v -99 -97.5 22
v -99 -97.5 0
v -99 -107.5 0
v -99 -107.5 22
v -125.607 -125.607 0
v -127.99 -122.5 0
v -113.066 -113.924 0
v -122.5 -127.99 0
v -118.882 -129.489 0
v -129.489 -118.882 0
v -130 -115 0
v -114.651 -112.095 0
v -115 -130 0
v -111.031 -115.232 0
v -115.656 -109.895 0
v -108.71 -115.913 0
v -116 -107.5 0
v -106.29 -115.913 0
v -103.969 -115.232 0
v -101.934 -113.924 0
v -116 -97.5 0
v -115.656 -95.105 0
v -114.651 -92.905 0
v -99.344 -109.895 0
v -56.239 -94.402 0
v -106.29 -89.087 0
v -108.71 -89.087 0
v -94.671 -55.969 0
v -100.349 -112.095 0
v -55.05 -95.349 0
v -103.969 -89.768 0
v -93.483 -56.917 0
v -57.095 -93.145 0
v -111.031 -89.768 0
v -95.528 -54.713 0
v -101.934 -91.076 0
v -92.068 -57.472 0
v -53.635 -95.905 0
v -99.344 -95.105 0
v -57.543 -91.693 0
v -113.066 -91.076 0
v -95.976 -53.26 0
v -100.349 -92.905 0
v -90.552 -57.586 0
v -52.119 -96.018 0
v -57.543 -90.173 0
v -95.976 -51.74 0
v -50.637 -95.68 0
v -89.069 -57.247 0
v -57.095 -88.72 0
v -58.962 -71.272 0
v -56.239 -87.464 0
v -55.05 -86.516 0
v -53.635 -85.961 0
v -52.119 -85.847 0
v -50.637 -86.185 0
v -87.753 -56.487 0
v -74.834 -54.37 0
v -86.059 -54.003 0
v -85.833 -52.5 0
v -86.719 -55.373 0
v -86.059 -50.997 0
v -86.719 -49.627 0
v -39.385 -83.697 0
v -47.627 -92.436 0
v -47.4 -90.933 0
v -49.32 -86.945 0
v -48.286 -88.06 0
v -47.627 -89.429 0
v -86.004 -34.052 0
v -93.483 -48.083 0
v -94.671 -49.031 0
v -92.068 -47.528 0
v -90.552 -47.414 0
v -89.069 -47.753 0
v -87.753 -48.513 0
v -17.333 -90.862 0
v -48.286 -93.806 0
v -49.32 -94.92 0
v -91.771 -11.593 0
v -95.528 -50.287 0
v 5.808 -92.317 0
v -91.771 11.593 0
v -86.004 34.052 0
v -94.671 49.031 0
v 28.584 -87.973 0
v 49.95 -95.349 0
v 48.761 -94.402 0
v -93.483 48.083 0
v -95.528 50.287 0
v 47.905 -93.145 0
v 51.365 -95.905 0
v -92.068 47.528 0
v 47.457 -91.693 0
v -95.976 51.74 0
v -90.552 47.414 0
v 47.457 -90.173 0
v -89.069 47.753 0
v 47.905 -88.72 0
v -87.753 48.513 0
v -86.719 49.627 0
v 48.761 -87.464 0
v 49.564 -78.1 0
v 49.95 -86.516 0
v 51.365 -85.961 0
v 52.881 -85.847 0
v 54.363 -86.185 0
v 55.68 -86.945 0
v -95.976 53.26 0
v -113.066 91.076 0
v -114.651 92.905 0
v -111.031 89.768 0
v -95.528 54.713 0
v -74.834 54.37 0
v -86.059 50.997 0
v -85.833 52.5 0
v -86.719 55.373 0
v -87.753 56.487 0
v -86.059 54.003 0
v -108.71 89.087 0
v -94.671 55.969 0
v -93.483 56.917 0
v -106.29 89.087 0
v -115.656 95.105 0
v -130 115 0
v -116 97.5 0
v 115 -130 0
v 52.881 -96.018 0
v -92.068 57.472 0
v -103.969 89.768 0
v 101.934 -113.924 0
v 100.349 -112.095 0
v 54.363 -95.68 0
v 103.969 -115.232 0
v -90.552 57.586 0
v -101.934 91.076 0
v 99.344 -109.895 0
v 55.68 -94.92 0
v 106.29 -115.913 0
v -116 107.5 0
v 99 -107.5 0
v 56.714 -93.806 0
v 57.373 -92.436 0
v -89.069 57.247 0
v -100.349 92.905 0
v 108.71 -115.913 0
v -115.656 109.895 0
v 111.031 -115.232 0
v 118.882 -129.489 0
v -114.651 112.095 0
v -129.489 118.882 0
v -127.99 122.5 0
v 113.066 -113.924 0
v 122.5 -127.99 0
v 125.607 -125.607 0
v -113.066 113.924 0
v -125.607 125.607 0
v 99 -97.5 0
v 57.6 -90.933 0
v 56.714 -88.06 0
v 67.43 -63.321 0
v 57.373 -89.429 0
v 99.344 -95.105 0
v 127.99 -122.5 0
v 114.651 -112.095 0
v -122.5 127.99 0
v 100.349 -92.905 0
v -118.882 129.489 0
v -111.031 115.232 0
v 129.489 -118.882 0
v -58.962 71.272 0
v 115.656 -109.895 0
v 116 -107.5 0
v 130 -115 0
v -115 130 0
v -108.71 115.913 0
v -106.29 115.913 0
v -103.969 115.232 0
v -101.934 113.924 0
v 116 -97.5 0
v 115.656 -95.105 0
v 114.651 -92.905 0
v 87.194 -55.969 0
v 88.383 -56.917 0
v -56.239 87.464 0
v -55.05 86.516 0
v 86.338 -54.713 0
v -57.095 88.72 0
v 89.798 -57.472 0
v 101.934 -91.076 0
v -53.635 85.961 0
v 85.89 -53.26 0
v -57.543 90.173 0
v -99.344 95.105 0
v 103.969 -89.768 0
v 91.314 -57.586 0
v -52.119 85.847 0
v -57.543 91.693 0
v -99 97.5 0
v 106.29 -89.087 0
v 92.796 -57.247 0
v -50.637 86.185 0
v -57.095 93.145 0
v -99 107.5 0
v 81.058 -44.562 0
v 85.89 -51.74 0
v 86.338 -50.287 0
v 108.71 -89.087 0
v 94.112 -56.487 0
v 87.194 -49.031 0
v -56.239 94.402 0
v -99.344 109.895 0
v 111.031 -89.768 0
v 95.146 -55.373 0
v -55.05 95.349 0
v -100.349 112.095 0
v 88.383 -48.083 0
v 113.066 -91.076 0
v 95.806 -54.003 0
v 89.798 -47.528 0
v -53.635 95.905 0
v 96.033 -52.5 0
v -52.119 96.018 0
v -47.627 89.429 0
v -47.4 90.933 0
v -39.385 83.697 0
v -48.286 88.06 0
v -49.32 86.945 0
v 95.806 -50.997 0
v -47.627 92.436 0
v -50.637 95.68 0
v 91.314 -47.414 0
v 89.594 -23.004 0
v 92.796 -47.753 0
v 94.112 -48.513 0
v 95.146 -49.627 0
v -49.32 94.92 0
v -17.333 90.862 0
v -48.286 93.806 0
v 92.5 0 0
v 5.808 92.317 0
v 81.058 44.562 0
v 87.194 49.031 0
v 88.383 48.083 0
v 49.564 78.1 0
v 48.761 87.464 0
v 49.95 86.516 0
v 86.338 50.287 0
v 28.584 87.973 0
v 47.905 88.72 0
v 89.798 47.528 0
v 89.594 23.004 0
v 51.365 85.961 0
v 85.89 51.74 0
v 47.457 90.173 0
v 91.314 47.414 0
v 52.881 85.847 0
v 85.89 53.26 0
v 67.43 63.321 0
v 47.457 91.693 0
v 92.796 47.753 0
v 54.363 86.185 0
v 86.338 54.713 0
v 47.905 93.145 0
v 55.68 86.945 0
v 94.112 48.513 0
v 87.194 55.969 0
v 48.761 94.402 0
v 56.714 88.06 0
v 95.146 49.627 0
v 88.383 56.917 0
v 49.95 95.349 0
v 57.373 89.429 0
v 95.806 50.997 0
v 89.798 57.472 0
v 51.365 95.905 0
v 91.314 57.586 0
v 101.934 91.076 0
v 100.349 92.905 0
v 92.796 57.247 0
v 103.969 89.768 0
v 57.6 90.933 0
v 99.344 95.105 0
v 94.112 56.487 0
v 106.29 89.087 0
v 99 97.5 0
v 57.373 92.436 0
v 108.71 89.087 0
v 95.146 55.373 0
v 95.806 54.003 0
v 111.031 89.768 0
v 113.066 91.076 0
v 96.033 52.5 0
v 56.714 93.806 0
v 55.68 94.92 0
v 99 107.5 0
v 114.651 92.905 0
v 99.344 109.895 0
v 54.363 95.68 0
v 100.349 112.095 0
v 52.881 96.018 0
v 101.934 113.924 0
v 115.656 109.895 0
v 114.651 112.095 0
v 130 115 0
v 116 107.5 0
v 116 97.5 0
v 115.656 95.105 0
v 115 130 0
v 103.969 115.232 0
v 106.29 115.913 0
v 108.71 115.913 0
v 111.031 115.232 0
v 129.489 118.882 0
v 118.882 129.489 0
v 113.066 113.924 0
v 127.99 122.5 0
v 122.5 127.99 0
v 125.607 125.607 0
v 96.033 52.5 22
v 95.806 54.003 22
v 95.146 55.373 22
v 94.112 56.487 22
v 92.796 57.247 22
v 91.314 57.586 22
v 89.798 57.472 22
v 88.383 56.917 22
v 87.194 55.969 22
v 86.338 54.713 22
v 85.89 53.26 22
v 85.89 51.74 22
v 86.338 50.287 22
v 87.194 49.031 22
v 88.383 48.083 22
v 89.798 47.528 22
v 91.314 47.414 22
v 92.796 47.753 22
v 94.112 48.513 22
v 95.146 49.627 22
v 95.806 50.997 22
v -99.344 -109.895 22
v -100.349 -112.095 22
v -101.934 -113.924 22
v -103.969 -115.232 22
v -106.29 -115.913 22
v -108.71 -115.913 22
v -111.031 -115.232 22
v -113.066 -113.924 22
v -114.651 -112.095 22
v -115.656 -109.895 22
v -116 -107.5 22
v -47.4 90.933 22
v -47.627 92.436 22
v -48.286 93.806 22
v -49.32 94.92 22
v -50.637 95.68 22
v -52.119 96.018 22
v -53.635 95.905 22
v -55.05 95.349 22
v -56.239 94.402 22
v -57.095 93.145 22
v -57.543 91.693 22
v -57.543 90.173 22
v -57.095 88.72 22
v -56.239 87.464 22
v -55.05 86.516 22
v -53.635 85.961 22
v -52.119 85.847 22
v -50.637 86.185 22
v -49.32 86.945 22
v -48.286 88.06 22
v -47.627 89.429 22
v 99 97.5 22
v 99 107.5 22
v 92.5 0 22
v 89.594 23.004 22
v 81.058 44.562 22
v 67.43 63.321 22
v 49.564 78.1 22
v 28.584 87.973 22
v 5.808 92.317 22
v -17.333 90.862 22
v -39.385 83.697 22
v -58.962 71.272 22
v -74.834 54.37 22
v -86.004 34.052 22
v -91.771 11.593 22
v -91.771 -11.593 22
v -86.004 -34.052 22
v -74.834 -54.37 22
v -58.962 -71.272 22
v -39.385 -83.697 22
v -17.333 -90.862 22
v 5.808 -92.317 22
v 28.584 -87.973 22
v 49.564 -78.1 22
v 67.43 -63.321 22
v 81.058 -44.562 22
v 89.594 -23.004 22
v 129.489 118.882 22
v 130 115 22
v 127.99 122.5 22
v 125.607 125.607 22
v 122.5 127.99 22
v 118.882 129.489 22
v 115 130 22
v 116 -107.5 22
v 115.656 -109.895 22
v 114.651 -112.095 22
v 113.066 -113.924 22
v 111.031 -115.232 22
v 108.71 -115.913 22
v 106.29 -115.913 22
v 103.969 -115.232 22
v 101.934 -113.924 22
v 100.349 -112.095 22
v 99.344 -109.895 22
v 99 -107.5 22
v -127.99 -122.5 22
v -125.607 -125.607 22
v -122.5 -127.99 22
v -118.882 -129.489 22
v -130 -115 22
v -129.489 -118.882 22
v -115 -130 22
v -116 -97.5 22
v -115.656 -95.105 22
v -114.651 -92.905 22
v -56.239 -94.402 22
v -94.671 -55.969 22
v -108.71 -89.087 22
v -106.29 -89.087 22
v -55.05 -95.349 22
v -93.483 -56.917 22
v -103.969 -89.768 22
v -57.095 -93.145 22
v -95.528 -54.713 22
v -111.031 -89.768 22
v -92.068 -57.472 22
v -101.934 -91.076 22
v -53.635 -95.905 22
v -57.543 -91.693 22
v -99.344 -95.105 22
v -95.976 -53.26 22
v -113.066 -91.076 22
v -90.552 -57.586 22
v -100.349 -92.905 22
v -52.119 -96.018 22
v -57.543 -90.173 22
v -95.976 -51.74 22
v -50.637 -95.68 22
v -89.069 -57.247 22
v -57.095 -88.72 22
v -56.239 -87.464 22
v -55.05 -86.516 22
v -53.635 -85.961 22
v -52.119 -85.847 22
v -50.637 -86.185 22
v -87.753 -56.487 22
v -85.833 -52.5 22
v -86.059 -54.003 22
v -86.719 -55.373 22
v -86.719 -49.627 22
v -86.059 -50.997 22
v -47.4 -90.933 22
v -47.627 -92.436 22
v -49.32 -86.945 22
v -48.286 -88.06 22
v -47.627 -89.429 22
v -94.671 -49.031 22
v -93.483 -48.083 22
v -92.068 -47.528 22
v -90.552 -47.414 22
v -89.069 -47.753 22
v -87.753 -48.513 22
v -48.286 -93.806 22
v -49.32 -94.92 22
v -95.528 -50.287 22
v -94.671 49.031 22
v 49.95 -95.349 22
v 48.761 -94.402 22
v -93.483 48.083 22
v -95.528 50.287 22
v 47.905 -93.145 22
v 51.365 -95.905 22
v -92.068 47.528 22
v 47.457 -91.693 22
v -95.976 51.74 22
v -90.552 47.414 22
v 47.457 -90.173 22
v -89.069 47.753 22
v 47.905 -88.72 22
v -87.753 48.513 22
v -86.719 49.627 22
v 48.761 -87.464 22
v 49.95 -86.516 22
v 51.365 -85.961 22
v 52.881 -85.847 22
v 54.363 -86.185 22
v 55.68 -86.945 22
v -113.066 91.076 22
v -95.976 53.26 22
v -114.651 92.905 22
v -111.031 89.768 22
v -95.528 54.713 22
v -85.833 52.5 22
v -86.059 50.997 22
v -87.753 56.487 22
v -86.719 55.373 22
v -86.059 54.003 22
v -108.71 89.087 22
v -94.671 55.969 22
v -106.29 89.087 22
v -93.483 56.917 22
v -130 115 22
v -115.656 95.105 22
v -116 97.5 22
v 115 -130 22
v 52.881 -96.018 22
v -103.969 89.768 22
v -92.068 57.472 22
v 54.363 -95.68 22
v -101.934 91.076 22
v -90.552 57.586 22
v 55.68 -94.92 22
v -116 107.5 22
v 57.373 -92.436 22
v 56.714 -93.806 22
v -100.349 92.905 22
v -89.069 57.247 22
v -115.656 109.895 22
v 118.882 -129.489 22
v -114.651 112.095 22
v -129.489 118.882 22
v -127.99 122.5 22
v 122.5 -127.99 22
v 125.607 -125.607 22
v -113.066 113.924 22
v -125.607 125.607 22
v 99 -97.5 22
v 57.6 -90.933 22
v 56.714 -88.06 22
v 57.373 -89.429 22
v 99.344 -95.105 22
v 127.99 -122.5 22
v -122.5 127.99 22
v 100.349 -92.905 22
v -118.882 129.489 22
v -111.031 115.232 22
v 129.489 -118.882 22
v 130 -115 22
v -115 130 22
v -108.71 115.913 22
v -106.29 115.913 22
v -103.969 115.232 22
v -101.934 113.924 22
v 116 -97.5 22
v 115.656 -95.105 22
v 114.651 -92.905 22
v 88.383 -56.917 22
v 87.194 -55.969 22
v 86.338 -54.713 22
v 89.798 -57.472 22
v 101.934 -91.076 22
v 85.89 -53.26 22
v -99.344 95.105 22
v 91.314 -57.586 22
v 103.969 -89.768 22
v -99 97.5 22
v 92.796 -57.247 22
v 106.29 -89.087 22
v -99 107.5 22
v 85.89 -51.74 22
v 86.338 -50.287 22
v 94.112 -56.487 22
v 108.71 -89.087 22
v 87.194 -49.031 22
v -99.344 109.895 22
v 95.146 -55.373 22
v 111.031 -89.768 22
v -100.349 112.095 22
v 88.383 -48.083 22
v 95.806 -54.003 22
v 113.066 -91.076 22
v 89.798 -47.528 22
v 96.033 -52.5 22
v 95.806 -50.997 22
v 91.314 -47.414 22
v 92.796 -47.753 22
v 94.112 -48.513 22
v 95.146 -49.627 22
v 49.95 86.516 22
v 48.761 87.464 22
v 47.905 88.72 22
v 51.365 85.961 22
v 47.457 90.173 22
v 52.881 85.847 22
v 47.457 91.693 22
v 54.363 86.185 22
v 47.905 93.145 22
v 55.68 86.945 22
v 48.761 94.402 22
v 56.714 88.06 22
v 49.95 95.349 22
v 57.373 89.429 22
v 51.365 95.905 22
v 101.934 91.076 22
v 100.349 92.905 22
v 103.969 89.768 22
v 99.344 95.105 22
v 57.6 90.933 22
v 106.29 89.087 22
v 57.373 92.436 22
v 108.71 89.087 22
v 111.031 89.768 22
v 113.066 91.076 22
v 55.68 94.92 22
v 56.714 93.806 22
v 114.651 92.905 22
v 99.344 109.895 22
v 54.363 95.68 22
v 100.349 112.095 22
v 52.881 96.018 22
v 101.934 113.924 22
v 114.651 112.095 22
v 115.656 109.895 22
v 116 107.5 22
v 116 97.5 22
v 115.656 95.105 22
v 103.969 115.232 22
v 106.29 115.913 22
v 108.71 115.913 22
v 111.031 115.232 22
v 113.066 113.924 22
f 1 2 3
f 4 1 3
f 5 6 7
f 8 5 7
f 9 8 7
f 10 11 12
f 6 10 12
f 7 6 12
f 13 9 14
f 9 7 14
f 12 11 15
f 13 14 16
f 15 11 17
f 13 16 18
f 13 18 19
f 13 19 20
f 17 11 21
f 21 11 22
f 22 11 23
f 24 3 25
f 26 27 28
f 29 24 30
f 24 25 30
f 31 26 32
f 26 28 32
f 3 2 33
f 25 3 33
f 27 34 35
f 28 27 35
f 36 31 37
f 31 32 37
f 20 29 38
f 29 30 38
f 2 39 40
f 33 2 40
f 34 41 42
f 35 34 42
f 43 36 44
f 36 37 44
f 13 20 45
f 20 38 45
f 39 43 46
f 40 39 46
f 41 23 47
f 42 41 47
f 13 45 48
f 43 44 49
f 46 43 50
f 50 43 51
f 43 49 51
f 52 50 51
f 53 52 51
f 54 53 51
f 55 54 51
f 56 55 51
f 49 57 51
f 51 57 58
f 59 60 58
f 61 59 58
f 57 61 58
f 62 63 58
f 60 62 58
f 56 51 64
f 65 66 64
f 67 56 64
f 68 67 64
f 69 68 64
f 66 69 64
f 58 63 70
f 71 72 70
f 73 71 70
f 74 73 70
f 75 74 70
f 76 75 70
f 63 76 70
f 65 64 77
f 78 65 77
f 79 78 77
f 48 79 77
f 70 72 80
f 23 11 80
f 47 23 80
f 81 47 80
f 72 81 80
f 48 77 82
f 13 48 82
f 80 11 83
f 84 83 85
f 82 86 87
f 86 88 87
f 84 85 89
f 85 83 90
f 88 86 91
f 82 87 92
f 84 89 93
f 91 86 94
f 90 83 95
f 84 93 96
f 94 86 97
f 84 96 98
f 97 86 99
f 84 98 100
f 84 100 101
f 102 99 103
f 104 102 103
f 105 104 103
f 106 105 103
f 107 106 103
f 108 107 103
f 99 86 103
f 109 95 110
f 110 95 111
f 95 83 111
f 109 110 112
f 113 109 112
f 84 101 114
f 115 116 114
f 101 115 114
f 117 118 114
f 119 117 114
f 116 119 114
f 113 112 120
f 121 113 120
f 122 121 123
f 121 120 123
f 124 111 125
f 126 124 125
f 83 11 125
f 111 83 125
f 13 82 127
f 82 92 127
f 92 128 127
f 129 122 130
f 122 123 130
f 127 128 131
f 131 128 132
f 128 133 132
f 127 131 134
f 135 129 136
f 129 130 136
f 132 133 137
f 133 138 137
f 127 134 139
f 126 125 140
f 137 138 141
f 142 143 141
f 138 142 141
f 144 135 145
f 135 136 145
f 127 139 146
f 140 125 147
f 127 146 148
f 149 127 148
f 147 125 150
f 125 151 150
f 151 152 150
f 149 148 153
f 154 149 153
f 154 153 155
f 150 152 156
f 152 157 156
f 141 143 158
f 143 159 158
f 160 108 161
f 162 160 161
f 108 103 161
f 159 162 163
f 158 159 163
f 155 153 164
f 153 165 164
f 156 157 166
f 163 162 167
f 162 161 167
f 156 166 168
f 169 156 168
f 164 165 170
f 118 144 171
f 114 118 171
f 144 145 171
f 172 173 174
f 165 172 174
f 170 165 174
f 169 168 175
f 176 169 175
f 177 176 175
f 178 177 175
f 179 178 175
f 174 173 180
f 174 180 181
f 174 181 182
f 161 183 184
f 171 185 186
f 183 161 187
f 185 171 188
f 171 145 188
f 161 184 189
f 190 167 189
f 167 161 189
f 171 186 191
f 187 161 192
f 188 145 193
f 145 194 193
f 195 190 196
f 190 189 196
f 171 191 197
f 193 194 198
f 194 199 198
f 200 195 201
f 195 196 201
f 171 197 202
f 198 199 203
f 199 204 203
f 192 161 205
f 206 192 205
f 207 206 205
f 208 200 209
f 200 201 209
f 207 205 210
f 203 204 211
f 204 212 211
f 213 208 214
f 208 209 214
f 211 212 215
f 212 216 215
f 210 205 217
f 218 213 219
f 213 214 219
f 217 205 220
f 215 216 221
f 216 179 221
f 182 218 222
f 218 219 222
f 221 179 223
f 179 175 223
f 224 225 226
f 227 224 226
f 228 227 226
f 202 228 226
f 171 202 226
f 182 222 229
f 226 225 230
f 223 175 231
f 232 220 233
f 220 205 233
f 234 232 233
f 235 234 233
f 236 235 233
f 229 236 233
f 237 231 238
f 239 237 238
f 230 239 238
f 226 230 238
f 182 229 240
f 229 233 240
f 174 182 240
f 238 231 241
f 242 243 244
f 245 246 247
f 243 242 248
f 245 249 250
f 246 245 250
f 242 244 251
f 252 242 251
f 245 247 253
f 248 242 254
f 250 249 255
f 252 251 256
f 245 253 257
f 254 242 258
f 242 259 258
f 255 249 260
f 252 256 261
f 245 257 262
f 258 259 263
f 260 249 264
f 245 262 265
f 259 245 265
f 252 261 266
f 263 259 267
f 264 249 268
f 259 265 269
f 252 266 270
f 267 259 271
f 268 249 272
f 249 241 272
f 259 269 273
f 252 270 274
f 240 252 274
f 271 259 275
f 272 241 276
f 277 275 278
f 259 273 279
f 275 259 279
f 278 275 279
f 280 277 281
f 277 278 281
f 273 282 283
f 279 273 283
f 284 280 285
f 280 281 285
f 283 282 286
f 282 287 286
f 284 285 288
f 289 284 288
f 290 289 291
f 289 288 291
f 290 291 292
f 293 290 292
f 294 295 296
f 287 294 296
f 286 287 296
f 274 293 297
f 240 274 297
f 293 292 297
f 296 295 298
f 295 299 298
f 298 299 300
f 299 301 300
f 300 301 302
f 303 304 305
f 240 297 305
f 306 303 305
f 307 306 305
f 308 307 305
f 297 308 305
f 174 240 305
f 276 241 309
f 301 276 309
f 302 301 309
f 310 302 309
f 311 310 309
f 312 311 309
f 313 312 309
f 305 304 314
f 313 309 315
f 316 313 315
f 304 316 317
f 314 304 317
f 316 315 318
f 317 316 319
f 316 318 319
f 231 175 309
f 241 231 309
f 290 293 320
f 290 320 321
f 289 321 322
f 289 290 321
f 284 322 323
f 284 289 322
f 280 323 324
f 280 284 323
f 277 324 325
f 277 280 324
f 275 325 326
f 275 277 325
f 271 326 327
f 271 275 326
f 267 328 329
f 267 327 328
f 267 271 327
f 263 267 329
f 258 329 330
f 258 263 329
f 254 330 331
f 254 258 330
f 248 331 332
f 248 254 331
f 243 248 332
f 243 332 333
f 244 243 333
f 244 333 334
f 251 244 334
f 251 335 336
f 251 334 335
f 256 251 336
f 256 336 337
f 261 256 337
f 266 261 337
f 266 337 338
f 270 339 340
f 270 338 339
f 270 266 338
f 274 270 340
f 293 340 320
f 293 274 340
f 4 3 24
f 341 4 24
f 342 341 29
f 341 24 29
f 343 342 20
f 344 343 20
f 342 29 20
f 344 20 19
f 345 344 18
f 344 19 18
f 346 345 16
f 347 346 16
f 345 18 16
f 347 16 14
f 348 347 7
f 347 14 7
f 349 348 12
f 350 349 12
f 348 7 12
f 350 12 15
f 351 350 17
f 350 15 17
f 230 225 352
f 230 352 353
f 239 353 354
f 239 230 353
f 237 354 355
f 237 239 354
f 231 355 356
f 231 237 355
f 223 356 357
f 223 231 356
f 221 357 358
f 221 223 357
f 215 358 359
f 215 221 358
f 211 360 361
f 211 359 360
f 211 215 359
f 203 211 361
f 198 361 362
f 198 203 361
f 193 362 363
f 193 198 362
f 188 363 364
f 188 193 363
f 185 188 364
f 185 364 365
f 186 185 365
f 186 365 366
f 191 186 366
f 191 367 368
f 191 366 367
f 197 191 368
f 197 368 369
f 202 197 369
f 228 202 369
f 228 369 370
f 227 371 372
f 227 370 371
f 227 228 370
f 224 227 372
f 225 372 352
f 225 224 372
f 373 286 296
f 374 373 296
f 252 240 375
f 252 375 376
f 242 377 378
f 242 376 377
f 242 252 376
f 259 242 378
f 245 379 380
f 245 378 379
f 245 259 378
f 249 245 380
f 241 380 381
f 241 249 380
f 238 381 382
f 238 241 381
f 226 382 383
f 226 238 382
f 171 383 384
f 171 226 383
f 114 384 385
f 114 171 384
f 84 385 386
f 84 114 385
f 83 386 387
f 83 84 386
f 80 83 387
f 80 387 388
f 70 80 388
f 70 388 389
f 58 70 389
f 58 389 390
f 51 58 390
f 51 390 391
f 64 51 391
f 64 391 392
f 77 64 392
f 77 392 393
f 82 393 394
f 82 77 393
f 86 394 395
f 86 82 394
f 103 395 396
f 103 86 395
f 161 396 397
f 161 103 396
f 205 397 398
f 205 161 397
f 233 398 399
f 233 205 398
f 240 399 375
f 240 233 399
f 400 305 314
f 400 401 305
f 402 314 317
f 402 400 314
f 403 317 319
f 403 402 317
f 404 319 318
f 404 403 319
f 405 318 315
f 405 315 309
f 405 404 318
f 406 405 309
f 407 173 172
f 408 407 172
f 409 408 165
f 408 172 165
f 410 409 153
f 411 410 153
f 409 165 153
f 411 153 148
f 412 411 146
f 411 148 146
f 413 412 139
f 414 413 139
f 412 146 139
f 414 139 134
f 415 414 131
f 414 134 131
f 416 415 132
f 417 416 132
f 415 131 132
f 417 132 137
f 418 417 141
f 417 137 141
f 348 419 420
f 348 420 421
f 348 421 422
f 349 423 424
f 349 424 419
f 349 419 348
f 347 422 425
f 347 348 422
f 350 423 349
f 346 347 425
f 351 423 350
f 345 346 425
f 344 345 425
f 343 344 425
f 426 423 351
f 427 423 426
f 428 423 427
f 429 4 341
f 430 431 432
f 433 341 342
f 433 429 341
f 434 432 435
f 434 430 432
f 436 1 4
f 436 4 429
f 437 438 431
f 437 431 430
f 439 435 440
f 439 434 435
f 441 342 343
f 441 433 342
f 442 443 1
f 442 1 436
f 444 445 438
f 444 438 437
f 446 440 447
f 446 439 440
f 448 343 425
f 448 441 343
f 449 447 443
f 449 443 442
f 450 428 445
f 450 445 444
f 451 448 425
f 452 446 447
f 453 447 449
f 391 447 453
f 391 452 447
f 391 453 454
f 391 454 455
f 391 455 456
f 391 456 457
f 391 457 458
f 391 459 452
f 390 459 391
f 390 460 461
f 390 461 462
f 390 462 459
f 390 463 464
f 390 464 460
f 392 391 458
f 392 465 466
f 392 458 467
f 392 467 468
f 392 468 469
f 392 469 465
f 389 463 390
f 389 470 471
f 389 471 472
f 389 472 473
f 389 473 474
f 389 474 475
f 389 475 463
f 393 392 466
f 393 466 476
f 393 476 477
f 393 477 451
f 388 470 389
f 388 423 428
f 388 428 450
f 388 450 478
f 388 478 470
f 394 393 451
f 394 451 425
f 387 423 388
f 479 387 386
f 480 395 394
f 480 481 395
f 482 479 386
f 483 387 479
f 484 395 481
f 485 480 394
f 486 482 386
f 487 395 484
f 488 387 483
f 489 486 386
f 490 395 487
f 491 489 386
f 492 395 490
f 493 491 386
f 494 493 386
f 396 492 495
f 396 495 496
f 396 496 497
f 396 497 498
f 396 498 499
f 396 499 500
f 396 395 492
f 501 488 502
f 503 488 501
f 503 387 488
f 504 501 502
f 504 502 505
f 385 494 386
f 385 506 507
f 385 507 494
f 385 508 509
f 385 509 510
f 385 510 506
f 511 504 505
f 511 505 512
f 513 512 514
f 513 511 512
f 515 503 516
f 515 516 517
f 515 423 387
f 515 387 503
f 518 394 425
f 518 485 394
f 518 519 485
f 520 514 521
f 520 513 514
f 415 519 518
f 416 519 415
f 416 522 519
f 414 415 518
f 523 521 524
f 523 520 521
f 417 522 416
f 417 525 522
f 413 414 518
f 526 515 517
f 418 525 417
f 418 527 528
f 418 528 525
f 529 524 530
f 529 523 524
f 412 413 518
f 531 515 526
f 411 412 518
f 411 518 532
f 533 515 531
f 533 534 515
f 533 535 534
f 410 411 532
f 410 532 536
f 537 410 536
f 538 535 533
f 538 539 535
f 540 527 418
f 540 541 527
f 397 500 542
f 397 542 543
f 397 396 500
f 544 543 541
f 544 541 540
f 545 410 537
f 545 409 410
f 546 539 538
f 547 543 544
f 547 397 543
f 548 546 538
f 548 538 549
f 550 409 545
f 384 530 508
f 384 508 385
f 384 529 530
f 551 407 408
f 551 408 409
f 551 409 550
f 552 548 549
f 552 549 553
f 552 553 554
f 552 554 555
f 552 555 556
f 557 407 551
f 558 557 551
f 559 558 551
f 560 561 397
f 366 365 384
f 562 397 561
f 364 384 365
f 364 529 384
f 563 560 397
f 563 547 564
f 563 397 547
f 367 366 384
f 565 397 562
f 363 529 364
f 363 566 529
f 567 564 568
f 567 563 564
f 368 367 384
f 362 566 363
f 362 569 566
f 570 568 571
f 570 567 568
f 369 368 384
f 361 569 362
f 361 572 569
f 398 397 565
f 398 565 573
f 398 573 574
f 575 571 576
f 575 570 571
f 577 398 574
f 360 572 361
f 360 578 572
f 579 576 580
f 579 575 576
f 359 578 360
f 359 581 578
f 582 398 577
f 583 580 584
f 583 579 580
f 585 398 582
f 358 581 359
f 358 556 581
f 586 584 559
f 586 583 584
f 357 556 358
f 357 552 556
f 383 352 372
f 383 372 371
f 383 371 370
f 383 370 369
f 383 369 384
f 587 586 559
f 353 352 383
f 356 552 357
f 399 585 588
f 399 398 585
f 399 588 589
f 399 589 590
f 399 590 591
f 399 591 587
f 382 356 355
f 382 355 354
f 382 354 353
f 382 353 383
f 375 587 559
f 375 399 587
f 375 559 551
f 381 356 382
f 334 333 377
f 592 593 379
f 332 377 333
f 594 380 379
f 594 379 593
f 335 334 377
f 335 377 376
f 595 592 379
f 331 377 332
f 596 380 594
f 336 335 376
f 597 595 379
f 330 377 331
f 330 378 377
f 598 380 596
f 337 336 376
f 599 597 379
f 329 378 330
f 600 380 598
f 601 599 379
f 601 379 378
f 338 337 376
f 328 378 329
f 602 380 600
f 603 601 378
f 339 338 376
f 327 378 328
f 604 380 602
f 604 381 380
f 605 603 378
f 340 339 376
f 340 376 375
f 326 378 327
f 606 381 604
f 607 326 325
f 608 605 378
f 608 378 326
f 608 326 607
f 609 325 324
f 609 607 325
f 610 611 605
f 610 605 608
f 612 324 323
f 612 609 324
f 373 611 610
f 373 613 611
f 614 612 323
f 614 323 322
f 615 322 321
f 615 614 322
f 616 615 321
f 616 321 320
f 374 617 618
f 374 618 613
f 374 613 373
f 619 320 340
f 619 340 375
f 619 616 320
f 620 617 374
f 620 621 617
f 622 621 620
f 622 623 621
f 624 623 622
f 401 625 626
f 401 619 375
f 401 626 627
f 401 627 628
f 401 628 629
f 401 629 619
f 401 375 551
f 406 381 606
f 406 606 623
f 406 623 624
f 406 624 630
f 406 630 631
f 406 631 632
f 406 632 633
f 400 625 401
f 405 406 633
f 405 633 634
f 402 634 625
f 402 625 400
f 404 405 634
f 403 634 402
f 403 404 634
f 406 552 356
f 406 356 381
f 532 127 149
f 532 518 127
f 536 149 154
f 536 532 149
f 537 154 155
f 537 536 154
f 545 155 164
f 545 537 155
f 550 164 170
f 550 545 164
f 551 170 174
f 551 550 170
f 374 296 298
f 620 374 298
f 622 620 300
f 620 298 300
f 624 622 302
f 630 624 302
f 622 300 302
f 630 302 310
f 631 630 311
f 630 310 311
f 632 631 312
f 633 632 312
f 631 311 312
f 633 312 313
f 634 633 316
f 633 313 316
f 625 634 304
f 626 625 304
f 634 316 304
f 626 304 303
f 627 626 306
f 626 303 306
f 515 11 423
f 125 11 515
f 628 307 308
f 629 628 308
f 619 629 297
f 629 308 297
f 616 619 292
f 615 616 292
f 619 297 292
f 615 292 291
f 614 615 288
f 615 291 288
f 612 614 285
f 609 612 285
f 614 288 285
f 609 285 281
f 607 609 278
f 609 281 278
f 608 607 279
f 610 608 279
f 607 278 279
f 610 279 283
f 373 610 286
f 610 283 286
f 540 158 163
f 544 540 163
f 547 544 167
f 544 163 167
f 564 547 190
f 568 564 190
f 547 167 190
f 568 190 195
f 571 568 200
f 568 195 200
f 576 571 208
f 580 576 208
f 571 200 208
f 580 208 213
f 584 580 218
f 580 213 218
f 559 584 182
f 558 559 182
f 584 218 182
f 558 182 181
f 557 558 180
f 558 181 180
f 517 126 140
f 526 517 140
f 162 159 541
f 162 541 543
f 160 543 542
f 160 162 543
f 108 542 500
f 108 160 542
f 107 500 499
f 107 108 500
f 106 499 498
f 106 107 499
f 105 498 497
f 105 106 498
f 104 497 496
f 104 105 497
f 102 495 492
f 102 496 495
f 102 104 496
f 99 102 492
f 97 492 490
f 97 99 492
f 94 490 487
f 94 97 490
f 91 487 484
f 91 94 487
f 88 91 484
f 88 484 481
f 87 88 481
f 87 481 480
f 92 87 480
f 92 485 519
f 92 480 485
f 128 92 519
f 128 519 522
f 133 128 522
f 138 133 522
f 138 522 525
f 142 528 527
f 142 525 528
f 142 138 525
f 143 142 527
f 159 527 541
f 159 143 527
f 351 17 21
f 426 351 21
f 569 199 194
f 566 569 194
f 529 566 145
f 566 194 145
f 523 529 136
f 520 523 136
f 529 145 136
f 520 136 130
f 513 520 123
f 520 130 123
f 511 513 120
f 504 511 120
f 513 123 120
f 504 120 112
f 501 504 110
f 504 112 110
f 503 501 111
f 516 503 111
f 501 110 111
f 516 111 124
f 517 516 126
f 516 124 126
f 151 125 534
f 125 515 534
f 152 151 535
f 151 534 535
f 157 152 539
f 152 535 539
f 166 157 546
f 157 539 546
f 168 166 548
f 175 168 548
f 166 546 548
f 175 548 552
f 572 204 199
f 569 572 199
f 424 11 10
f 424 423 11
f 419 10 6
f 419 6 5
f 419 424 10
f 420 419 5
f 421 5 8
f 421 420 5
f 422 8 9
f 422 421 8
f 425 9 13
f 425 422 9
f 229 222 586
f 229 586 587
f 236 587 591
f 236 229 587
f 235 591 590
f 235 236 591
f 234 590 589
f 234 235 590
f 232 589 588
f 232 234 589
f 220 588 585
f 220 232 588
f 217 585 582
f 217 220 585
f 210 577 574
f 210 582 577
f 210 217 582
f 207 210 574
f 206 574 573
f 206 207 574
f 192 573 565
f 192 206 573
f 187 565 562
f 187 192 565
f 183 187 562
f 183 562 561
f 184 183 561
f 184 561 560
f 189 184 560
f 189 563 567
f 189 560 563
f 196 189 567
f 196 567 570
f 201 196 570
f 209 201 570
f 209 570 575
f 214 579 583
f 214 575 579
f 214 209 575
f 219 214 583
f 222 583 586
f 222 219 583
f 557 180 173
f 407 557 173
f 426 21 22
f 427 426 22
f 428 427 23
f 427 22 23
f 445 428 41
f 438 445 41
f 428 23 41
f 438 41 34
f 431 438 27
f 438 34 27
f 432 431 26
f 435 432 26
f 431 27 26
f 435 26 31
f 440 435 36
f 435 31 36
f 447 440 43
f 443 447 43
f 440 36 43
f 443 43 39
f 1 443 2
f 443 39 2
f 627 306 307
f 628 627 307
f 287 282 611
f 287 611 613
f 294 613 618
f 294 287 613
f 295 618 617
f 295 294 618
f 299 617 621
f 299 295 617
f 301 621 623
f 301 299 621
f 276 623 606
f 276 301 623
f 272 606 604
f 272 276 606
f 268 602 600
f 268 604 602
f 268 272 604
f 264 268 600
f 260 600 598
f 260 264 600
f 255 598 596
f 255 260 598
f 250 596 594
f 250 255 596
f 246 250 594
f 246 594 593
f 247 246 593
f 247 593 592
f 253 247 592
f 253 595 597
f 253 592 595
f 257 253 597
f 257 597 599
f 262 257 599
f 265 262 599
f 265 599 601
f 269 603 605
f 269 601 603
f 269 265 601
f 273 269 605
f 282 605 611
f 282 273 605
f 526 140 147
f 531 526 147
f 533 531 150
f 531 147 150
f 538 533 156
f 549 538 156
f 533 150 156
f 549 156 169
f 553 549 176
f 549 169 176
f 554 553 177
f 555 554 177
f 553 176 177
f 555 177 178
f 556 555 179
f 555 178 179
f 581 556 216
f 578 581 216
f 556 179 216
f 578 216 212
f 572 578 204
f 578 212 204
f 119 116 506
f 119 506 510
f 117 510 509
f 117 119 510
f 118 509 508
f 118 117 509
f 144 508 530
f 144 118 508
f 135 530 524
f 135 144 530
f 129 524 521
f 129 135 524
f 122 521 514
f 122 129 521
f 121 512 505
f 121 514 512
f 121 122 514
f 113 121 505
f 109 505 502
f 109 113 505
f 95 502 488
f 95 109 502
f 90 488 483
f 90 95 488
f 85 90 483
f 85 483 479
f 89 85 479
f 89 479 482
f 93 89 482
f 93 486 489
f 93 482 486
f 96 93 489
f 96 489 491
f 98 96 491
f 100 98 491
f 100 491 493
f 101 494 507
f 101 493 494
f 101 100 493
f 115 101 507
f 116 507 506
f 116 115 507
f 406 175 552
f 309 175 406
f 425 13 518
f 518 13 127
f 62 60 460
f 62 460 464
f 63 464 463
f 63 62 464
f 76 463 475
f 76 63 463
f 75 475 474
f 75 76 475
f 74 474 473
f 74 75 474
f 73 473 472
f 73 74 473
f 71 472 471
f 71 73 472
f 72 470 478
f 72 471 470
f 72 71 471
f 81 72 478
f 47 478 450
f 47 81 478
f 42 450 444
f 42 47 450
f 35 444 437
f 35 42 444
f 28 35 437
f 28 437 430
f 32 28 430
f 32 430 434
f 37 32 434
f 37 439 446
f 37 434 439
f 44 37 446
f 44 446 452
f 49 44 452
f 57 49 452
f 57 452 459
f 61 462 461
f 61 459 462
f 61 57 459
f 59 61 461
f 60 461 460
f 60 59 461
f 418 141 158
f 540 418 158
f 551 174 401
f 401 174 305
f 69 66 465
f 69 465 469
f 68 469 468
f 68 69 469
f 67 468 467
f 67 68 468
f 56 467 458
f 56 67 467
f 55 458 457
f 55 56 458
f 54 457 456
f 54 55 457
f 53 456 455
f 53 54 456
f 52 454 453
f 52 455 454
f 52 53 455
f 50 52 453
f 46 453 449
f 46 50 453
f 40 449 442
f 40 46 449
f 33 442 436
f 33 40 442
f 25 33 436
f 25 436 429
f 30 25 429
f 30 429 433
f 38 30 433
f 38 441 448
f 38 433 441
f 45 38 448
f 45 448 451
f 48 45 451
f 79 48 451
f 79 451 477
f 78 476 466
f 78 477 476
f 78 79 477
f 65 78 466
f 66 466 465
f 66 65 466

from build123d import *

# Parameters (mm, degrees)
SKETCH_1_W               = 260
SKETCH_1_H               = 260
EXTRUDE_1_DEPTH          = 22
FILLET_1_R               = 15
CUT_EXTRUDE_1_DEPTH      = 186.159390796
CUT_EXTRUDE_1_DEPTH_BACK = 186.159390796
SKETCH_2_R               = 92.5
SKETCH_2_R_2             = 5.1
CUT_EXTRUDE_2_DEPTH      = 186.159390796
CUT_EXTRUDE_2_DEPTH_BACK = 186.159390796


with BuildPart() as part:
    # ｽｹｯﾁ1 → ﾎﾞｽ - 押し出し1 (new body)
    with BuildSketch(Plane.XY):
        Rectangle(SKETCH_1_W, SKETCH_1_H)
    extrude(amount=EXTRUDE_1_DEPTH)

    # ﾌｨﾚｯﾄ1
    fillet_1_edges = [part.edges().sort_by_distance(p)[0] for p in [
        (-130, 130, 11),
        (130, 130, 11),
        (130, -130, 11),
        (-130, -130, 11),
    ]]
    fillet(fillet_1_edges, radius=FILLET_1_R)

    # ｽｹｯﾁ2 → ｶｯﾄ - 押し出し1 (cut, two sides: drawn at the far end of the back side and taken through both)
    with BuildSketch(Plane.XY.offset(-CUT_EXTRUDE_1_DEPTH_BACK)):
        Circle(SKETCH_2_R)
        with Locations((90.932667397, 52.5)):
            Circle(SKETCH_2_R_2)
        with Locations((52.5, 90.932667397)):
            Circle(SKETCH_2_R_2)
        with Locations((-52.5, 90.932667397)):
            Circle(SKETCH_2_R_2)
        with Locations((-90.932667397, 52.5)):
            Circle(SKETCH_2_R_2)
        with Locations((-90.932667397, -52.5)):
            Circle(SKETCH_2_R_2)
        with Locations((-52.5, -90.932667397)):
            Circle(SKETCH_2_R_2)
        with Locations((52.5, -90.932667397)):
            Circle(SKETCH_2_R_2)
        with Locations((90.932667397, -52.5)):
            Circle(SKETCH_2_R_2)
    extrude(amount=CUT_EXTRUDE_1_DEPTH + CUT_EXTRUDE_1_DEPTH_BACK, mode=Mode.SUBTRACT)

    # ｽｹｯﾁ3 → ｶｯﾄ - 押し出し2 (cut, two sides: drawn at the far end of the back side and taken through both)
    with BuildSketch(Plane.XY.offset(-CUT_EXTRUDE_2_DEPTH_BACK)):
        with BuildLine():
            Line((-116, -107.5), (-116, -97.5))
            ThreePointArc((-116, -97.5), (-107.5, -89), (-99, -97.5))
            Line((-99, -97.5), (-99, -107.5))
            ThreePointArc((-99, -107.5), (-107.5, -116), (-116, -107.5))
        make_face()
        with BuildLine():
            Line((-116, 97.5), (-116, 107.5))
            ThreePointArc((-116, 107.5), (-107.5, 116), (-99, 107.5))
            Line((-99, 107.5), (-99, 97.5))
            ThreePointArc((-99, 97.5), (-107.5, 89), (-116, 97.5))
        make_face()
        with BuildLine():
            Line((99, -107.5), (99, -97.5))
            ThreePointArc((99, -97.5), (107.5, -89), (116, -97.5))
            Line((116, -97.5), (116, -107.5))
            ThreePointArc((116, -107.5), (107.5, -116), (99, -107.5))
        make_face()
        with BuildLine():
            Line((99, 97.5), (99, 107.5))
            ThreePointArc((99, 107.5), (107.5, 116), (116, 107.5))
            Line((116, 107.5), (116, 97.5))
            ThreePointArc((116, 97.5), (107.5, 89), (99, 97.5))
        make_face()
    extrude(amount=CUT_EXTRUDE_2_DEPTH + CUT_EXTRUDE_2_DEPTH_BACK, mode=Mode.SUBTRACT)


solid = part.part
